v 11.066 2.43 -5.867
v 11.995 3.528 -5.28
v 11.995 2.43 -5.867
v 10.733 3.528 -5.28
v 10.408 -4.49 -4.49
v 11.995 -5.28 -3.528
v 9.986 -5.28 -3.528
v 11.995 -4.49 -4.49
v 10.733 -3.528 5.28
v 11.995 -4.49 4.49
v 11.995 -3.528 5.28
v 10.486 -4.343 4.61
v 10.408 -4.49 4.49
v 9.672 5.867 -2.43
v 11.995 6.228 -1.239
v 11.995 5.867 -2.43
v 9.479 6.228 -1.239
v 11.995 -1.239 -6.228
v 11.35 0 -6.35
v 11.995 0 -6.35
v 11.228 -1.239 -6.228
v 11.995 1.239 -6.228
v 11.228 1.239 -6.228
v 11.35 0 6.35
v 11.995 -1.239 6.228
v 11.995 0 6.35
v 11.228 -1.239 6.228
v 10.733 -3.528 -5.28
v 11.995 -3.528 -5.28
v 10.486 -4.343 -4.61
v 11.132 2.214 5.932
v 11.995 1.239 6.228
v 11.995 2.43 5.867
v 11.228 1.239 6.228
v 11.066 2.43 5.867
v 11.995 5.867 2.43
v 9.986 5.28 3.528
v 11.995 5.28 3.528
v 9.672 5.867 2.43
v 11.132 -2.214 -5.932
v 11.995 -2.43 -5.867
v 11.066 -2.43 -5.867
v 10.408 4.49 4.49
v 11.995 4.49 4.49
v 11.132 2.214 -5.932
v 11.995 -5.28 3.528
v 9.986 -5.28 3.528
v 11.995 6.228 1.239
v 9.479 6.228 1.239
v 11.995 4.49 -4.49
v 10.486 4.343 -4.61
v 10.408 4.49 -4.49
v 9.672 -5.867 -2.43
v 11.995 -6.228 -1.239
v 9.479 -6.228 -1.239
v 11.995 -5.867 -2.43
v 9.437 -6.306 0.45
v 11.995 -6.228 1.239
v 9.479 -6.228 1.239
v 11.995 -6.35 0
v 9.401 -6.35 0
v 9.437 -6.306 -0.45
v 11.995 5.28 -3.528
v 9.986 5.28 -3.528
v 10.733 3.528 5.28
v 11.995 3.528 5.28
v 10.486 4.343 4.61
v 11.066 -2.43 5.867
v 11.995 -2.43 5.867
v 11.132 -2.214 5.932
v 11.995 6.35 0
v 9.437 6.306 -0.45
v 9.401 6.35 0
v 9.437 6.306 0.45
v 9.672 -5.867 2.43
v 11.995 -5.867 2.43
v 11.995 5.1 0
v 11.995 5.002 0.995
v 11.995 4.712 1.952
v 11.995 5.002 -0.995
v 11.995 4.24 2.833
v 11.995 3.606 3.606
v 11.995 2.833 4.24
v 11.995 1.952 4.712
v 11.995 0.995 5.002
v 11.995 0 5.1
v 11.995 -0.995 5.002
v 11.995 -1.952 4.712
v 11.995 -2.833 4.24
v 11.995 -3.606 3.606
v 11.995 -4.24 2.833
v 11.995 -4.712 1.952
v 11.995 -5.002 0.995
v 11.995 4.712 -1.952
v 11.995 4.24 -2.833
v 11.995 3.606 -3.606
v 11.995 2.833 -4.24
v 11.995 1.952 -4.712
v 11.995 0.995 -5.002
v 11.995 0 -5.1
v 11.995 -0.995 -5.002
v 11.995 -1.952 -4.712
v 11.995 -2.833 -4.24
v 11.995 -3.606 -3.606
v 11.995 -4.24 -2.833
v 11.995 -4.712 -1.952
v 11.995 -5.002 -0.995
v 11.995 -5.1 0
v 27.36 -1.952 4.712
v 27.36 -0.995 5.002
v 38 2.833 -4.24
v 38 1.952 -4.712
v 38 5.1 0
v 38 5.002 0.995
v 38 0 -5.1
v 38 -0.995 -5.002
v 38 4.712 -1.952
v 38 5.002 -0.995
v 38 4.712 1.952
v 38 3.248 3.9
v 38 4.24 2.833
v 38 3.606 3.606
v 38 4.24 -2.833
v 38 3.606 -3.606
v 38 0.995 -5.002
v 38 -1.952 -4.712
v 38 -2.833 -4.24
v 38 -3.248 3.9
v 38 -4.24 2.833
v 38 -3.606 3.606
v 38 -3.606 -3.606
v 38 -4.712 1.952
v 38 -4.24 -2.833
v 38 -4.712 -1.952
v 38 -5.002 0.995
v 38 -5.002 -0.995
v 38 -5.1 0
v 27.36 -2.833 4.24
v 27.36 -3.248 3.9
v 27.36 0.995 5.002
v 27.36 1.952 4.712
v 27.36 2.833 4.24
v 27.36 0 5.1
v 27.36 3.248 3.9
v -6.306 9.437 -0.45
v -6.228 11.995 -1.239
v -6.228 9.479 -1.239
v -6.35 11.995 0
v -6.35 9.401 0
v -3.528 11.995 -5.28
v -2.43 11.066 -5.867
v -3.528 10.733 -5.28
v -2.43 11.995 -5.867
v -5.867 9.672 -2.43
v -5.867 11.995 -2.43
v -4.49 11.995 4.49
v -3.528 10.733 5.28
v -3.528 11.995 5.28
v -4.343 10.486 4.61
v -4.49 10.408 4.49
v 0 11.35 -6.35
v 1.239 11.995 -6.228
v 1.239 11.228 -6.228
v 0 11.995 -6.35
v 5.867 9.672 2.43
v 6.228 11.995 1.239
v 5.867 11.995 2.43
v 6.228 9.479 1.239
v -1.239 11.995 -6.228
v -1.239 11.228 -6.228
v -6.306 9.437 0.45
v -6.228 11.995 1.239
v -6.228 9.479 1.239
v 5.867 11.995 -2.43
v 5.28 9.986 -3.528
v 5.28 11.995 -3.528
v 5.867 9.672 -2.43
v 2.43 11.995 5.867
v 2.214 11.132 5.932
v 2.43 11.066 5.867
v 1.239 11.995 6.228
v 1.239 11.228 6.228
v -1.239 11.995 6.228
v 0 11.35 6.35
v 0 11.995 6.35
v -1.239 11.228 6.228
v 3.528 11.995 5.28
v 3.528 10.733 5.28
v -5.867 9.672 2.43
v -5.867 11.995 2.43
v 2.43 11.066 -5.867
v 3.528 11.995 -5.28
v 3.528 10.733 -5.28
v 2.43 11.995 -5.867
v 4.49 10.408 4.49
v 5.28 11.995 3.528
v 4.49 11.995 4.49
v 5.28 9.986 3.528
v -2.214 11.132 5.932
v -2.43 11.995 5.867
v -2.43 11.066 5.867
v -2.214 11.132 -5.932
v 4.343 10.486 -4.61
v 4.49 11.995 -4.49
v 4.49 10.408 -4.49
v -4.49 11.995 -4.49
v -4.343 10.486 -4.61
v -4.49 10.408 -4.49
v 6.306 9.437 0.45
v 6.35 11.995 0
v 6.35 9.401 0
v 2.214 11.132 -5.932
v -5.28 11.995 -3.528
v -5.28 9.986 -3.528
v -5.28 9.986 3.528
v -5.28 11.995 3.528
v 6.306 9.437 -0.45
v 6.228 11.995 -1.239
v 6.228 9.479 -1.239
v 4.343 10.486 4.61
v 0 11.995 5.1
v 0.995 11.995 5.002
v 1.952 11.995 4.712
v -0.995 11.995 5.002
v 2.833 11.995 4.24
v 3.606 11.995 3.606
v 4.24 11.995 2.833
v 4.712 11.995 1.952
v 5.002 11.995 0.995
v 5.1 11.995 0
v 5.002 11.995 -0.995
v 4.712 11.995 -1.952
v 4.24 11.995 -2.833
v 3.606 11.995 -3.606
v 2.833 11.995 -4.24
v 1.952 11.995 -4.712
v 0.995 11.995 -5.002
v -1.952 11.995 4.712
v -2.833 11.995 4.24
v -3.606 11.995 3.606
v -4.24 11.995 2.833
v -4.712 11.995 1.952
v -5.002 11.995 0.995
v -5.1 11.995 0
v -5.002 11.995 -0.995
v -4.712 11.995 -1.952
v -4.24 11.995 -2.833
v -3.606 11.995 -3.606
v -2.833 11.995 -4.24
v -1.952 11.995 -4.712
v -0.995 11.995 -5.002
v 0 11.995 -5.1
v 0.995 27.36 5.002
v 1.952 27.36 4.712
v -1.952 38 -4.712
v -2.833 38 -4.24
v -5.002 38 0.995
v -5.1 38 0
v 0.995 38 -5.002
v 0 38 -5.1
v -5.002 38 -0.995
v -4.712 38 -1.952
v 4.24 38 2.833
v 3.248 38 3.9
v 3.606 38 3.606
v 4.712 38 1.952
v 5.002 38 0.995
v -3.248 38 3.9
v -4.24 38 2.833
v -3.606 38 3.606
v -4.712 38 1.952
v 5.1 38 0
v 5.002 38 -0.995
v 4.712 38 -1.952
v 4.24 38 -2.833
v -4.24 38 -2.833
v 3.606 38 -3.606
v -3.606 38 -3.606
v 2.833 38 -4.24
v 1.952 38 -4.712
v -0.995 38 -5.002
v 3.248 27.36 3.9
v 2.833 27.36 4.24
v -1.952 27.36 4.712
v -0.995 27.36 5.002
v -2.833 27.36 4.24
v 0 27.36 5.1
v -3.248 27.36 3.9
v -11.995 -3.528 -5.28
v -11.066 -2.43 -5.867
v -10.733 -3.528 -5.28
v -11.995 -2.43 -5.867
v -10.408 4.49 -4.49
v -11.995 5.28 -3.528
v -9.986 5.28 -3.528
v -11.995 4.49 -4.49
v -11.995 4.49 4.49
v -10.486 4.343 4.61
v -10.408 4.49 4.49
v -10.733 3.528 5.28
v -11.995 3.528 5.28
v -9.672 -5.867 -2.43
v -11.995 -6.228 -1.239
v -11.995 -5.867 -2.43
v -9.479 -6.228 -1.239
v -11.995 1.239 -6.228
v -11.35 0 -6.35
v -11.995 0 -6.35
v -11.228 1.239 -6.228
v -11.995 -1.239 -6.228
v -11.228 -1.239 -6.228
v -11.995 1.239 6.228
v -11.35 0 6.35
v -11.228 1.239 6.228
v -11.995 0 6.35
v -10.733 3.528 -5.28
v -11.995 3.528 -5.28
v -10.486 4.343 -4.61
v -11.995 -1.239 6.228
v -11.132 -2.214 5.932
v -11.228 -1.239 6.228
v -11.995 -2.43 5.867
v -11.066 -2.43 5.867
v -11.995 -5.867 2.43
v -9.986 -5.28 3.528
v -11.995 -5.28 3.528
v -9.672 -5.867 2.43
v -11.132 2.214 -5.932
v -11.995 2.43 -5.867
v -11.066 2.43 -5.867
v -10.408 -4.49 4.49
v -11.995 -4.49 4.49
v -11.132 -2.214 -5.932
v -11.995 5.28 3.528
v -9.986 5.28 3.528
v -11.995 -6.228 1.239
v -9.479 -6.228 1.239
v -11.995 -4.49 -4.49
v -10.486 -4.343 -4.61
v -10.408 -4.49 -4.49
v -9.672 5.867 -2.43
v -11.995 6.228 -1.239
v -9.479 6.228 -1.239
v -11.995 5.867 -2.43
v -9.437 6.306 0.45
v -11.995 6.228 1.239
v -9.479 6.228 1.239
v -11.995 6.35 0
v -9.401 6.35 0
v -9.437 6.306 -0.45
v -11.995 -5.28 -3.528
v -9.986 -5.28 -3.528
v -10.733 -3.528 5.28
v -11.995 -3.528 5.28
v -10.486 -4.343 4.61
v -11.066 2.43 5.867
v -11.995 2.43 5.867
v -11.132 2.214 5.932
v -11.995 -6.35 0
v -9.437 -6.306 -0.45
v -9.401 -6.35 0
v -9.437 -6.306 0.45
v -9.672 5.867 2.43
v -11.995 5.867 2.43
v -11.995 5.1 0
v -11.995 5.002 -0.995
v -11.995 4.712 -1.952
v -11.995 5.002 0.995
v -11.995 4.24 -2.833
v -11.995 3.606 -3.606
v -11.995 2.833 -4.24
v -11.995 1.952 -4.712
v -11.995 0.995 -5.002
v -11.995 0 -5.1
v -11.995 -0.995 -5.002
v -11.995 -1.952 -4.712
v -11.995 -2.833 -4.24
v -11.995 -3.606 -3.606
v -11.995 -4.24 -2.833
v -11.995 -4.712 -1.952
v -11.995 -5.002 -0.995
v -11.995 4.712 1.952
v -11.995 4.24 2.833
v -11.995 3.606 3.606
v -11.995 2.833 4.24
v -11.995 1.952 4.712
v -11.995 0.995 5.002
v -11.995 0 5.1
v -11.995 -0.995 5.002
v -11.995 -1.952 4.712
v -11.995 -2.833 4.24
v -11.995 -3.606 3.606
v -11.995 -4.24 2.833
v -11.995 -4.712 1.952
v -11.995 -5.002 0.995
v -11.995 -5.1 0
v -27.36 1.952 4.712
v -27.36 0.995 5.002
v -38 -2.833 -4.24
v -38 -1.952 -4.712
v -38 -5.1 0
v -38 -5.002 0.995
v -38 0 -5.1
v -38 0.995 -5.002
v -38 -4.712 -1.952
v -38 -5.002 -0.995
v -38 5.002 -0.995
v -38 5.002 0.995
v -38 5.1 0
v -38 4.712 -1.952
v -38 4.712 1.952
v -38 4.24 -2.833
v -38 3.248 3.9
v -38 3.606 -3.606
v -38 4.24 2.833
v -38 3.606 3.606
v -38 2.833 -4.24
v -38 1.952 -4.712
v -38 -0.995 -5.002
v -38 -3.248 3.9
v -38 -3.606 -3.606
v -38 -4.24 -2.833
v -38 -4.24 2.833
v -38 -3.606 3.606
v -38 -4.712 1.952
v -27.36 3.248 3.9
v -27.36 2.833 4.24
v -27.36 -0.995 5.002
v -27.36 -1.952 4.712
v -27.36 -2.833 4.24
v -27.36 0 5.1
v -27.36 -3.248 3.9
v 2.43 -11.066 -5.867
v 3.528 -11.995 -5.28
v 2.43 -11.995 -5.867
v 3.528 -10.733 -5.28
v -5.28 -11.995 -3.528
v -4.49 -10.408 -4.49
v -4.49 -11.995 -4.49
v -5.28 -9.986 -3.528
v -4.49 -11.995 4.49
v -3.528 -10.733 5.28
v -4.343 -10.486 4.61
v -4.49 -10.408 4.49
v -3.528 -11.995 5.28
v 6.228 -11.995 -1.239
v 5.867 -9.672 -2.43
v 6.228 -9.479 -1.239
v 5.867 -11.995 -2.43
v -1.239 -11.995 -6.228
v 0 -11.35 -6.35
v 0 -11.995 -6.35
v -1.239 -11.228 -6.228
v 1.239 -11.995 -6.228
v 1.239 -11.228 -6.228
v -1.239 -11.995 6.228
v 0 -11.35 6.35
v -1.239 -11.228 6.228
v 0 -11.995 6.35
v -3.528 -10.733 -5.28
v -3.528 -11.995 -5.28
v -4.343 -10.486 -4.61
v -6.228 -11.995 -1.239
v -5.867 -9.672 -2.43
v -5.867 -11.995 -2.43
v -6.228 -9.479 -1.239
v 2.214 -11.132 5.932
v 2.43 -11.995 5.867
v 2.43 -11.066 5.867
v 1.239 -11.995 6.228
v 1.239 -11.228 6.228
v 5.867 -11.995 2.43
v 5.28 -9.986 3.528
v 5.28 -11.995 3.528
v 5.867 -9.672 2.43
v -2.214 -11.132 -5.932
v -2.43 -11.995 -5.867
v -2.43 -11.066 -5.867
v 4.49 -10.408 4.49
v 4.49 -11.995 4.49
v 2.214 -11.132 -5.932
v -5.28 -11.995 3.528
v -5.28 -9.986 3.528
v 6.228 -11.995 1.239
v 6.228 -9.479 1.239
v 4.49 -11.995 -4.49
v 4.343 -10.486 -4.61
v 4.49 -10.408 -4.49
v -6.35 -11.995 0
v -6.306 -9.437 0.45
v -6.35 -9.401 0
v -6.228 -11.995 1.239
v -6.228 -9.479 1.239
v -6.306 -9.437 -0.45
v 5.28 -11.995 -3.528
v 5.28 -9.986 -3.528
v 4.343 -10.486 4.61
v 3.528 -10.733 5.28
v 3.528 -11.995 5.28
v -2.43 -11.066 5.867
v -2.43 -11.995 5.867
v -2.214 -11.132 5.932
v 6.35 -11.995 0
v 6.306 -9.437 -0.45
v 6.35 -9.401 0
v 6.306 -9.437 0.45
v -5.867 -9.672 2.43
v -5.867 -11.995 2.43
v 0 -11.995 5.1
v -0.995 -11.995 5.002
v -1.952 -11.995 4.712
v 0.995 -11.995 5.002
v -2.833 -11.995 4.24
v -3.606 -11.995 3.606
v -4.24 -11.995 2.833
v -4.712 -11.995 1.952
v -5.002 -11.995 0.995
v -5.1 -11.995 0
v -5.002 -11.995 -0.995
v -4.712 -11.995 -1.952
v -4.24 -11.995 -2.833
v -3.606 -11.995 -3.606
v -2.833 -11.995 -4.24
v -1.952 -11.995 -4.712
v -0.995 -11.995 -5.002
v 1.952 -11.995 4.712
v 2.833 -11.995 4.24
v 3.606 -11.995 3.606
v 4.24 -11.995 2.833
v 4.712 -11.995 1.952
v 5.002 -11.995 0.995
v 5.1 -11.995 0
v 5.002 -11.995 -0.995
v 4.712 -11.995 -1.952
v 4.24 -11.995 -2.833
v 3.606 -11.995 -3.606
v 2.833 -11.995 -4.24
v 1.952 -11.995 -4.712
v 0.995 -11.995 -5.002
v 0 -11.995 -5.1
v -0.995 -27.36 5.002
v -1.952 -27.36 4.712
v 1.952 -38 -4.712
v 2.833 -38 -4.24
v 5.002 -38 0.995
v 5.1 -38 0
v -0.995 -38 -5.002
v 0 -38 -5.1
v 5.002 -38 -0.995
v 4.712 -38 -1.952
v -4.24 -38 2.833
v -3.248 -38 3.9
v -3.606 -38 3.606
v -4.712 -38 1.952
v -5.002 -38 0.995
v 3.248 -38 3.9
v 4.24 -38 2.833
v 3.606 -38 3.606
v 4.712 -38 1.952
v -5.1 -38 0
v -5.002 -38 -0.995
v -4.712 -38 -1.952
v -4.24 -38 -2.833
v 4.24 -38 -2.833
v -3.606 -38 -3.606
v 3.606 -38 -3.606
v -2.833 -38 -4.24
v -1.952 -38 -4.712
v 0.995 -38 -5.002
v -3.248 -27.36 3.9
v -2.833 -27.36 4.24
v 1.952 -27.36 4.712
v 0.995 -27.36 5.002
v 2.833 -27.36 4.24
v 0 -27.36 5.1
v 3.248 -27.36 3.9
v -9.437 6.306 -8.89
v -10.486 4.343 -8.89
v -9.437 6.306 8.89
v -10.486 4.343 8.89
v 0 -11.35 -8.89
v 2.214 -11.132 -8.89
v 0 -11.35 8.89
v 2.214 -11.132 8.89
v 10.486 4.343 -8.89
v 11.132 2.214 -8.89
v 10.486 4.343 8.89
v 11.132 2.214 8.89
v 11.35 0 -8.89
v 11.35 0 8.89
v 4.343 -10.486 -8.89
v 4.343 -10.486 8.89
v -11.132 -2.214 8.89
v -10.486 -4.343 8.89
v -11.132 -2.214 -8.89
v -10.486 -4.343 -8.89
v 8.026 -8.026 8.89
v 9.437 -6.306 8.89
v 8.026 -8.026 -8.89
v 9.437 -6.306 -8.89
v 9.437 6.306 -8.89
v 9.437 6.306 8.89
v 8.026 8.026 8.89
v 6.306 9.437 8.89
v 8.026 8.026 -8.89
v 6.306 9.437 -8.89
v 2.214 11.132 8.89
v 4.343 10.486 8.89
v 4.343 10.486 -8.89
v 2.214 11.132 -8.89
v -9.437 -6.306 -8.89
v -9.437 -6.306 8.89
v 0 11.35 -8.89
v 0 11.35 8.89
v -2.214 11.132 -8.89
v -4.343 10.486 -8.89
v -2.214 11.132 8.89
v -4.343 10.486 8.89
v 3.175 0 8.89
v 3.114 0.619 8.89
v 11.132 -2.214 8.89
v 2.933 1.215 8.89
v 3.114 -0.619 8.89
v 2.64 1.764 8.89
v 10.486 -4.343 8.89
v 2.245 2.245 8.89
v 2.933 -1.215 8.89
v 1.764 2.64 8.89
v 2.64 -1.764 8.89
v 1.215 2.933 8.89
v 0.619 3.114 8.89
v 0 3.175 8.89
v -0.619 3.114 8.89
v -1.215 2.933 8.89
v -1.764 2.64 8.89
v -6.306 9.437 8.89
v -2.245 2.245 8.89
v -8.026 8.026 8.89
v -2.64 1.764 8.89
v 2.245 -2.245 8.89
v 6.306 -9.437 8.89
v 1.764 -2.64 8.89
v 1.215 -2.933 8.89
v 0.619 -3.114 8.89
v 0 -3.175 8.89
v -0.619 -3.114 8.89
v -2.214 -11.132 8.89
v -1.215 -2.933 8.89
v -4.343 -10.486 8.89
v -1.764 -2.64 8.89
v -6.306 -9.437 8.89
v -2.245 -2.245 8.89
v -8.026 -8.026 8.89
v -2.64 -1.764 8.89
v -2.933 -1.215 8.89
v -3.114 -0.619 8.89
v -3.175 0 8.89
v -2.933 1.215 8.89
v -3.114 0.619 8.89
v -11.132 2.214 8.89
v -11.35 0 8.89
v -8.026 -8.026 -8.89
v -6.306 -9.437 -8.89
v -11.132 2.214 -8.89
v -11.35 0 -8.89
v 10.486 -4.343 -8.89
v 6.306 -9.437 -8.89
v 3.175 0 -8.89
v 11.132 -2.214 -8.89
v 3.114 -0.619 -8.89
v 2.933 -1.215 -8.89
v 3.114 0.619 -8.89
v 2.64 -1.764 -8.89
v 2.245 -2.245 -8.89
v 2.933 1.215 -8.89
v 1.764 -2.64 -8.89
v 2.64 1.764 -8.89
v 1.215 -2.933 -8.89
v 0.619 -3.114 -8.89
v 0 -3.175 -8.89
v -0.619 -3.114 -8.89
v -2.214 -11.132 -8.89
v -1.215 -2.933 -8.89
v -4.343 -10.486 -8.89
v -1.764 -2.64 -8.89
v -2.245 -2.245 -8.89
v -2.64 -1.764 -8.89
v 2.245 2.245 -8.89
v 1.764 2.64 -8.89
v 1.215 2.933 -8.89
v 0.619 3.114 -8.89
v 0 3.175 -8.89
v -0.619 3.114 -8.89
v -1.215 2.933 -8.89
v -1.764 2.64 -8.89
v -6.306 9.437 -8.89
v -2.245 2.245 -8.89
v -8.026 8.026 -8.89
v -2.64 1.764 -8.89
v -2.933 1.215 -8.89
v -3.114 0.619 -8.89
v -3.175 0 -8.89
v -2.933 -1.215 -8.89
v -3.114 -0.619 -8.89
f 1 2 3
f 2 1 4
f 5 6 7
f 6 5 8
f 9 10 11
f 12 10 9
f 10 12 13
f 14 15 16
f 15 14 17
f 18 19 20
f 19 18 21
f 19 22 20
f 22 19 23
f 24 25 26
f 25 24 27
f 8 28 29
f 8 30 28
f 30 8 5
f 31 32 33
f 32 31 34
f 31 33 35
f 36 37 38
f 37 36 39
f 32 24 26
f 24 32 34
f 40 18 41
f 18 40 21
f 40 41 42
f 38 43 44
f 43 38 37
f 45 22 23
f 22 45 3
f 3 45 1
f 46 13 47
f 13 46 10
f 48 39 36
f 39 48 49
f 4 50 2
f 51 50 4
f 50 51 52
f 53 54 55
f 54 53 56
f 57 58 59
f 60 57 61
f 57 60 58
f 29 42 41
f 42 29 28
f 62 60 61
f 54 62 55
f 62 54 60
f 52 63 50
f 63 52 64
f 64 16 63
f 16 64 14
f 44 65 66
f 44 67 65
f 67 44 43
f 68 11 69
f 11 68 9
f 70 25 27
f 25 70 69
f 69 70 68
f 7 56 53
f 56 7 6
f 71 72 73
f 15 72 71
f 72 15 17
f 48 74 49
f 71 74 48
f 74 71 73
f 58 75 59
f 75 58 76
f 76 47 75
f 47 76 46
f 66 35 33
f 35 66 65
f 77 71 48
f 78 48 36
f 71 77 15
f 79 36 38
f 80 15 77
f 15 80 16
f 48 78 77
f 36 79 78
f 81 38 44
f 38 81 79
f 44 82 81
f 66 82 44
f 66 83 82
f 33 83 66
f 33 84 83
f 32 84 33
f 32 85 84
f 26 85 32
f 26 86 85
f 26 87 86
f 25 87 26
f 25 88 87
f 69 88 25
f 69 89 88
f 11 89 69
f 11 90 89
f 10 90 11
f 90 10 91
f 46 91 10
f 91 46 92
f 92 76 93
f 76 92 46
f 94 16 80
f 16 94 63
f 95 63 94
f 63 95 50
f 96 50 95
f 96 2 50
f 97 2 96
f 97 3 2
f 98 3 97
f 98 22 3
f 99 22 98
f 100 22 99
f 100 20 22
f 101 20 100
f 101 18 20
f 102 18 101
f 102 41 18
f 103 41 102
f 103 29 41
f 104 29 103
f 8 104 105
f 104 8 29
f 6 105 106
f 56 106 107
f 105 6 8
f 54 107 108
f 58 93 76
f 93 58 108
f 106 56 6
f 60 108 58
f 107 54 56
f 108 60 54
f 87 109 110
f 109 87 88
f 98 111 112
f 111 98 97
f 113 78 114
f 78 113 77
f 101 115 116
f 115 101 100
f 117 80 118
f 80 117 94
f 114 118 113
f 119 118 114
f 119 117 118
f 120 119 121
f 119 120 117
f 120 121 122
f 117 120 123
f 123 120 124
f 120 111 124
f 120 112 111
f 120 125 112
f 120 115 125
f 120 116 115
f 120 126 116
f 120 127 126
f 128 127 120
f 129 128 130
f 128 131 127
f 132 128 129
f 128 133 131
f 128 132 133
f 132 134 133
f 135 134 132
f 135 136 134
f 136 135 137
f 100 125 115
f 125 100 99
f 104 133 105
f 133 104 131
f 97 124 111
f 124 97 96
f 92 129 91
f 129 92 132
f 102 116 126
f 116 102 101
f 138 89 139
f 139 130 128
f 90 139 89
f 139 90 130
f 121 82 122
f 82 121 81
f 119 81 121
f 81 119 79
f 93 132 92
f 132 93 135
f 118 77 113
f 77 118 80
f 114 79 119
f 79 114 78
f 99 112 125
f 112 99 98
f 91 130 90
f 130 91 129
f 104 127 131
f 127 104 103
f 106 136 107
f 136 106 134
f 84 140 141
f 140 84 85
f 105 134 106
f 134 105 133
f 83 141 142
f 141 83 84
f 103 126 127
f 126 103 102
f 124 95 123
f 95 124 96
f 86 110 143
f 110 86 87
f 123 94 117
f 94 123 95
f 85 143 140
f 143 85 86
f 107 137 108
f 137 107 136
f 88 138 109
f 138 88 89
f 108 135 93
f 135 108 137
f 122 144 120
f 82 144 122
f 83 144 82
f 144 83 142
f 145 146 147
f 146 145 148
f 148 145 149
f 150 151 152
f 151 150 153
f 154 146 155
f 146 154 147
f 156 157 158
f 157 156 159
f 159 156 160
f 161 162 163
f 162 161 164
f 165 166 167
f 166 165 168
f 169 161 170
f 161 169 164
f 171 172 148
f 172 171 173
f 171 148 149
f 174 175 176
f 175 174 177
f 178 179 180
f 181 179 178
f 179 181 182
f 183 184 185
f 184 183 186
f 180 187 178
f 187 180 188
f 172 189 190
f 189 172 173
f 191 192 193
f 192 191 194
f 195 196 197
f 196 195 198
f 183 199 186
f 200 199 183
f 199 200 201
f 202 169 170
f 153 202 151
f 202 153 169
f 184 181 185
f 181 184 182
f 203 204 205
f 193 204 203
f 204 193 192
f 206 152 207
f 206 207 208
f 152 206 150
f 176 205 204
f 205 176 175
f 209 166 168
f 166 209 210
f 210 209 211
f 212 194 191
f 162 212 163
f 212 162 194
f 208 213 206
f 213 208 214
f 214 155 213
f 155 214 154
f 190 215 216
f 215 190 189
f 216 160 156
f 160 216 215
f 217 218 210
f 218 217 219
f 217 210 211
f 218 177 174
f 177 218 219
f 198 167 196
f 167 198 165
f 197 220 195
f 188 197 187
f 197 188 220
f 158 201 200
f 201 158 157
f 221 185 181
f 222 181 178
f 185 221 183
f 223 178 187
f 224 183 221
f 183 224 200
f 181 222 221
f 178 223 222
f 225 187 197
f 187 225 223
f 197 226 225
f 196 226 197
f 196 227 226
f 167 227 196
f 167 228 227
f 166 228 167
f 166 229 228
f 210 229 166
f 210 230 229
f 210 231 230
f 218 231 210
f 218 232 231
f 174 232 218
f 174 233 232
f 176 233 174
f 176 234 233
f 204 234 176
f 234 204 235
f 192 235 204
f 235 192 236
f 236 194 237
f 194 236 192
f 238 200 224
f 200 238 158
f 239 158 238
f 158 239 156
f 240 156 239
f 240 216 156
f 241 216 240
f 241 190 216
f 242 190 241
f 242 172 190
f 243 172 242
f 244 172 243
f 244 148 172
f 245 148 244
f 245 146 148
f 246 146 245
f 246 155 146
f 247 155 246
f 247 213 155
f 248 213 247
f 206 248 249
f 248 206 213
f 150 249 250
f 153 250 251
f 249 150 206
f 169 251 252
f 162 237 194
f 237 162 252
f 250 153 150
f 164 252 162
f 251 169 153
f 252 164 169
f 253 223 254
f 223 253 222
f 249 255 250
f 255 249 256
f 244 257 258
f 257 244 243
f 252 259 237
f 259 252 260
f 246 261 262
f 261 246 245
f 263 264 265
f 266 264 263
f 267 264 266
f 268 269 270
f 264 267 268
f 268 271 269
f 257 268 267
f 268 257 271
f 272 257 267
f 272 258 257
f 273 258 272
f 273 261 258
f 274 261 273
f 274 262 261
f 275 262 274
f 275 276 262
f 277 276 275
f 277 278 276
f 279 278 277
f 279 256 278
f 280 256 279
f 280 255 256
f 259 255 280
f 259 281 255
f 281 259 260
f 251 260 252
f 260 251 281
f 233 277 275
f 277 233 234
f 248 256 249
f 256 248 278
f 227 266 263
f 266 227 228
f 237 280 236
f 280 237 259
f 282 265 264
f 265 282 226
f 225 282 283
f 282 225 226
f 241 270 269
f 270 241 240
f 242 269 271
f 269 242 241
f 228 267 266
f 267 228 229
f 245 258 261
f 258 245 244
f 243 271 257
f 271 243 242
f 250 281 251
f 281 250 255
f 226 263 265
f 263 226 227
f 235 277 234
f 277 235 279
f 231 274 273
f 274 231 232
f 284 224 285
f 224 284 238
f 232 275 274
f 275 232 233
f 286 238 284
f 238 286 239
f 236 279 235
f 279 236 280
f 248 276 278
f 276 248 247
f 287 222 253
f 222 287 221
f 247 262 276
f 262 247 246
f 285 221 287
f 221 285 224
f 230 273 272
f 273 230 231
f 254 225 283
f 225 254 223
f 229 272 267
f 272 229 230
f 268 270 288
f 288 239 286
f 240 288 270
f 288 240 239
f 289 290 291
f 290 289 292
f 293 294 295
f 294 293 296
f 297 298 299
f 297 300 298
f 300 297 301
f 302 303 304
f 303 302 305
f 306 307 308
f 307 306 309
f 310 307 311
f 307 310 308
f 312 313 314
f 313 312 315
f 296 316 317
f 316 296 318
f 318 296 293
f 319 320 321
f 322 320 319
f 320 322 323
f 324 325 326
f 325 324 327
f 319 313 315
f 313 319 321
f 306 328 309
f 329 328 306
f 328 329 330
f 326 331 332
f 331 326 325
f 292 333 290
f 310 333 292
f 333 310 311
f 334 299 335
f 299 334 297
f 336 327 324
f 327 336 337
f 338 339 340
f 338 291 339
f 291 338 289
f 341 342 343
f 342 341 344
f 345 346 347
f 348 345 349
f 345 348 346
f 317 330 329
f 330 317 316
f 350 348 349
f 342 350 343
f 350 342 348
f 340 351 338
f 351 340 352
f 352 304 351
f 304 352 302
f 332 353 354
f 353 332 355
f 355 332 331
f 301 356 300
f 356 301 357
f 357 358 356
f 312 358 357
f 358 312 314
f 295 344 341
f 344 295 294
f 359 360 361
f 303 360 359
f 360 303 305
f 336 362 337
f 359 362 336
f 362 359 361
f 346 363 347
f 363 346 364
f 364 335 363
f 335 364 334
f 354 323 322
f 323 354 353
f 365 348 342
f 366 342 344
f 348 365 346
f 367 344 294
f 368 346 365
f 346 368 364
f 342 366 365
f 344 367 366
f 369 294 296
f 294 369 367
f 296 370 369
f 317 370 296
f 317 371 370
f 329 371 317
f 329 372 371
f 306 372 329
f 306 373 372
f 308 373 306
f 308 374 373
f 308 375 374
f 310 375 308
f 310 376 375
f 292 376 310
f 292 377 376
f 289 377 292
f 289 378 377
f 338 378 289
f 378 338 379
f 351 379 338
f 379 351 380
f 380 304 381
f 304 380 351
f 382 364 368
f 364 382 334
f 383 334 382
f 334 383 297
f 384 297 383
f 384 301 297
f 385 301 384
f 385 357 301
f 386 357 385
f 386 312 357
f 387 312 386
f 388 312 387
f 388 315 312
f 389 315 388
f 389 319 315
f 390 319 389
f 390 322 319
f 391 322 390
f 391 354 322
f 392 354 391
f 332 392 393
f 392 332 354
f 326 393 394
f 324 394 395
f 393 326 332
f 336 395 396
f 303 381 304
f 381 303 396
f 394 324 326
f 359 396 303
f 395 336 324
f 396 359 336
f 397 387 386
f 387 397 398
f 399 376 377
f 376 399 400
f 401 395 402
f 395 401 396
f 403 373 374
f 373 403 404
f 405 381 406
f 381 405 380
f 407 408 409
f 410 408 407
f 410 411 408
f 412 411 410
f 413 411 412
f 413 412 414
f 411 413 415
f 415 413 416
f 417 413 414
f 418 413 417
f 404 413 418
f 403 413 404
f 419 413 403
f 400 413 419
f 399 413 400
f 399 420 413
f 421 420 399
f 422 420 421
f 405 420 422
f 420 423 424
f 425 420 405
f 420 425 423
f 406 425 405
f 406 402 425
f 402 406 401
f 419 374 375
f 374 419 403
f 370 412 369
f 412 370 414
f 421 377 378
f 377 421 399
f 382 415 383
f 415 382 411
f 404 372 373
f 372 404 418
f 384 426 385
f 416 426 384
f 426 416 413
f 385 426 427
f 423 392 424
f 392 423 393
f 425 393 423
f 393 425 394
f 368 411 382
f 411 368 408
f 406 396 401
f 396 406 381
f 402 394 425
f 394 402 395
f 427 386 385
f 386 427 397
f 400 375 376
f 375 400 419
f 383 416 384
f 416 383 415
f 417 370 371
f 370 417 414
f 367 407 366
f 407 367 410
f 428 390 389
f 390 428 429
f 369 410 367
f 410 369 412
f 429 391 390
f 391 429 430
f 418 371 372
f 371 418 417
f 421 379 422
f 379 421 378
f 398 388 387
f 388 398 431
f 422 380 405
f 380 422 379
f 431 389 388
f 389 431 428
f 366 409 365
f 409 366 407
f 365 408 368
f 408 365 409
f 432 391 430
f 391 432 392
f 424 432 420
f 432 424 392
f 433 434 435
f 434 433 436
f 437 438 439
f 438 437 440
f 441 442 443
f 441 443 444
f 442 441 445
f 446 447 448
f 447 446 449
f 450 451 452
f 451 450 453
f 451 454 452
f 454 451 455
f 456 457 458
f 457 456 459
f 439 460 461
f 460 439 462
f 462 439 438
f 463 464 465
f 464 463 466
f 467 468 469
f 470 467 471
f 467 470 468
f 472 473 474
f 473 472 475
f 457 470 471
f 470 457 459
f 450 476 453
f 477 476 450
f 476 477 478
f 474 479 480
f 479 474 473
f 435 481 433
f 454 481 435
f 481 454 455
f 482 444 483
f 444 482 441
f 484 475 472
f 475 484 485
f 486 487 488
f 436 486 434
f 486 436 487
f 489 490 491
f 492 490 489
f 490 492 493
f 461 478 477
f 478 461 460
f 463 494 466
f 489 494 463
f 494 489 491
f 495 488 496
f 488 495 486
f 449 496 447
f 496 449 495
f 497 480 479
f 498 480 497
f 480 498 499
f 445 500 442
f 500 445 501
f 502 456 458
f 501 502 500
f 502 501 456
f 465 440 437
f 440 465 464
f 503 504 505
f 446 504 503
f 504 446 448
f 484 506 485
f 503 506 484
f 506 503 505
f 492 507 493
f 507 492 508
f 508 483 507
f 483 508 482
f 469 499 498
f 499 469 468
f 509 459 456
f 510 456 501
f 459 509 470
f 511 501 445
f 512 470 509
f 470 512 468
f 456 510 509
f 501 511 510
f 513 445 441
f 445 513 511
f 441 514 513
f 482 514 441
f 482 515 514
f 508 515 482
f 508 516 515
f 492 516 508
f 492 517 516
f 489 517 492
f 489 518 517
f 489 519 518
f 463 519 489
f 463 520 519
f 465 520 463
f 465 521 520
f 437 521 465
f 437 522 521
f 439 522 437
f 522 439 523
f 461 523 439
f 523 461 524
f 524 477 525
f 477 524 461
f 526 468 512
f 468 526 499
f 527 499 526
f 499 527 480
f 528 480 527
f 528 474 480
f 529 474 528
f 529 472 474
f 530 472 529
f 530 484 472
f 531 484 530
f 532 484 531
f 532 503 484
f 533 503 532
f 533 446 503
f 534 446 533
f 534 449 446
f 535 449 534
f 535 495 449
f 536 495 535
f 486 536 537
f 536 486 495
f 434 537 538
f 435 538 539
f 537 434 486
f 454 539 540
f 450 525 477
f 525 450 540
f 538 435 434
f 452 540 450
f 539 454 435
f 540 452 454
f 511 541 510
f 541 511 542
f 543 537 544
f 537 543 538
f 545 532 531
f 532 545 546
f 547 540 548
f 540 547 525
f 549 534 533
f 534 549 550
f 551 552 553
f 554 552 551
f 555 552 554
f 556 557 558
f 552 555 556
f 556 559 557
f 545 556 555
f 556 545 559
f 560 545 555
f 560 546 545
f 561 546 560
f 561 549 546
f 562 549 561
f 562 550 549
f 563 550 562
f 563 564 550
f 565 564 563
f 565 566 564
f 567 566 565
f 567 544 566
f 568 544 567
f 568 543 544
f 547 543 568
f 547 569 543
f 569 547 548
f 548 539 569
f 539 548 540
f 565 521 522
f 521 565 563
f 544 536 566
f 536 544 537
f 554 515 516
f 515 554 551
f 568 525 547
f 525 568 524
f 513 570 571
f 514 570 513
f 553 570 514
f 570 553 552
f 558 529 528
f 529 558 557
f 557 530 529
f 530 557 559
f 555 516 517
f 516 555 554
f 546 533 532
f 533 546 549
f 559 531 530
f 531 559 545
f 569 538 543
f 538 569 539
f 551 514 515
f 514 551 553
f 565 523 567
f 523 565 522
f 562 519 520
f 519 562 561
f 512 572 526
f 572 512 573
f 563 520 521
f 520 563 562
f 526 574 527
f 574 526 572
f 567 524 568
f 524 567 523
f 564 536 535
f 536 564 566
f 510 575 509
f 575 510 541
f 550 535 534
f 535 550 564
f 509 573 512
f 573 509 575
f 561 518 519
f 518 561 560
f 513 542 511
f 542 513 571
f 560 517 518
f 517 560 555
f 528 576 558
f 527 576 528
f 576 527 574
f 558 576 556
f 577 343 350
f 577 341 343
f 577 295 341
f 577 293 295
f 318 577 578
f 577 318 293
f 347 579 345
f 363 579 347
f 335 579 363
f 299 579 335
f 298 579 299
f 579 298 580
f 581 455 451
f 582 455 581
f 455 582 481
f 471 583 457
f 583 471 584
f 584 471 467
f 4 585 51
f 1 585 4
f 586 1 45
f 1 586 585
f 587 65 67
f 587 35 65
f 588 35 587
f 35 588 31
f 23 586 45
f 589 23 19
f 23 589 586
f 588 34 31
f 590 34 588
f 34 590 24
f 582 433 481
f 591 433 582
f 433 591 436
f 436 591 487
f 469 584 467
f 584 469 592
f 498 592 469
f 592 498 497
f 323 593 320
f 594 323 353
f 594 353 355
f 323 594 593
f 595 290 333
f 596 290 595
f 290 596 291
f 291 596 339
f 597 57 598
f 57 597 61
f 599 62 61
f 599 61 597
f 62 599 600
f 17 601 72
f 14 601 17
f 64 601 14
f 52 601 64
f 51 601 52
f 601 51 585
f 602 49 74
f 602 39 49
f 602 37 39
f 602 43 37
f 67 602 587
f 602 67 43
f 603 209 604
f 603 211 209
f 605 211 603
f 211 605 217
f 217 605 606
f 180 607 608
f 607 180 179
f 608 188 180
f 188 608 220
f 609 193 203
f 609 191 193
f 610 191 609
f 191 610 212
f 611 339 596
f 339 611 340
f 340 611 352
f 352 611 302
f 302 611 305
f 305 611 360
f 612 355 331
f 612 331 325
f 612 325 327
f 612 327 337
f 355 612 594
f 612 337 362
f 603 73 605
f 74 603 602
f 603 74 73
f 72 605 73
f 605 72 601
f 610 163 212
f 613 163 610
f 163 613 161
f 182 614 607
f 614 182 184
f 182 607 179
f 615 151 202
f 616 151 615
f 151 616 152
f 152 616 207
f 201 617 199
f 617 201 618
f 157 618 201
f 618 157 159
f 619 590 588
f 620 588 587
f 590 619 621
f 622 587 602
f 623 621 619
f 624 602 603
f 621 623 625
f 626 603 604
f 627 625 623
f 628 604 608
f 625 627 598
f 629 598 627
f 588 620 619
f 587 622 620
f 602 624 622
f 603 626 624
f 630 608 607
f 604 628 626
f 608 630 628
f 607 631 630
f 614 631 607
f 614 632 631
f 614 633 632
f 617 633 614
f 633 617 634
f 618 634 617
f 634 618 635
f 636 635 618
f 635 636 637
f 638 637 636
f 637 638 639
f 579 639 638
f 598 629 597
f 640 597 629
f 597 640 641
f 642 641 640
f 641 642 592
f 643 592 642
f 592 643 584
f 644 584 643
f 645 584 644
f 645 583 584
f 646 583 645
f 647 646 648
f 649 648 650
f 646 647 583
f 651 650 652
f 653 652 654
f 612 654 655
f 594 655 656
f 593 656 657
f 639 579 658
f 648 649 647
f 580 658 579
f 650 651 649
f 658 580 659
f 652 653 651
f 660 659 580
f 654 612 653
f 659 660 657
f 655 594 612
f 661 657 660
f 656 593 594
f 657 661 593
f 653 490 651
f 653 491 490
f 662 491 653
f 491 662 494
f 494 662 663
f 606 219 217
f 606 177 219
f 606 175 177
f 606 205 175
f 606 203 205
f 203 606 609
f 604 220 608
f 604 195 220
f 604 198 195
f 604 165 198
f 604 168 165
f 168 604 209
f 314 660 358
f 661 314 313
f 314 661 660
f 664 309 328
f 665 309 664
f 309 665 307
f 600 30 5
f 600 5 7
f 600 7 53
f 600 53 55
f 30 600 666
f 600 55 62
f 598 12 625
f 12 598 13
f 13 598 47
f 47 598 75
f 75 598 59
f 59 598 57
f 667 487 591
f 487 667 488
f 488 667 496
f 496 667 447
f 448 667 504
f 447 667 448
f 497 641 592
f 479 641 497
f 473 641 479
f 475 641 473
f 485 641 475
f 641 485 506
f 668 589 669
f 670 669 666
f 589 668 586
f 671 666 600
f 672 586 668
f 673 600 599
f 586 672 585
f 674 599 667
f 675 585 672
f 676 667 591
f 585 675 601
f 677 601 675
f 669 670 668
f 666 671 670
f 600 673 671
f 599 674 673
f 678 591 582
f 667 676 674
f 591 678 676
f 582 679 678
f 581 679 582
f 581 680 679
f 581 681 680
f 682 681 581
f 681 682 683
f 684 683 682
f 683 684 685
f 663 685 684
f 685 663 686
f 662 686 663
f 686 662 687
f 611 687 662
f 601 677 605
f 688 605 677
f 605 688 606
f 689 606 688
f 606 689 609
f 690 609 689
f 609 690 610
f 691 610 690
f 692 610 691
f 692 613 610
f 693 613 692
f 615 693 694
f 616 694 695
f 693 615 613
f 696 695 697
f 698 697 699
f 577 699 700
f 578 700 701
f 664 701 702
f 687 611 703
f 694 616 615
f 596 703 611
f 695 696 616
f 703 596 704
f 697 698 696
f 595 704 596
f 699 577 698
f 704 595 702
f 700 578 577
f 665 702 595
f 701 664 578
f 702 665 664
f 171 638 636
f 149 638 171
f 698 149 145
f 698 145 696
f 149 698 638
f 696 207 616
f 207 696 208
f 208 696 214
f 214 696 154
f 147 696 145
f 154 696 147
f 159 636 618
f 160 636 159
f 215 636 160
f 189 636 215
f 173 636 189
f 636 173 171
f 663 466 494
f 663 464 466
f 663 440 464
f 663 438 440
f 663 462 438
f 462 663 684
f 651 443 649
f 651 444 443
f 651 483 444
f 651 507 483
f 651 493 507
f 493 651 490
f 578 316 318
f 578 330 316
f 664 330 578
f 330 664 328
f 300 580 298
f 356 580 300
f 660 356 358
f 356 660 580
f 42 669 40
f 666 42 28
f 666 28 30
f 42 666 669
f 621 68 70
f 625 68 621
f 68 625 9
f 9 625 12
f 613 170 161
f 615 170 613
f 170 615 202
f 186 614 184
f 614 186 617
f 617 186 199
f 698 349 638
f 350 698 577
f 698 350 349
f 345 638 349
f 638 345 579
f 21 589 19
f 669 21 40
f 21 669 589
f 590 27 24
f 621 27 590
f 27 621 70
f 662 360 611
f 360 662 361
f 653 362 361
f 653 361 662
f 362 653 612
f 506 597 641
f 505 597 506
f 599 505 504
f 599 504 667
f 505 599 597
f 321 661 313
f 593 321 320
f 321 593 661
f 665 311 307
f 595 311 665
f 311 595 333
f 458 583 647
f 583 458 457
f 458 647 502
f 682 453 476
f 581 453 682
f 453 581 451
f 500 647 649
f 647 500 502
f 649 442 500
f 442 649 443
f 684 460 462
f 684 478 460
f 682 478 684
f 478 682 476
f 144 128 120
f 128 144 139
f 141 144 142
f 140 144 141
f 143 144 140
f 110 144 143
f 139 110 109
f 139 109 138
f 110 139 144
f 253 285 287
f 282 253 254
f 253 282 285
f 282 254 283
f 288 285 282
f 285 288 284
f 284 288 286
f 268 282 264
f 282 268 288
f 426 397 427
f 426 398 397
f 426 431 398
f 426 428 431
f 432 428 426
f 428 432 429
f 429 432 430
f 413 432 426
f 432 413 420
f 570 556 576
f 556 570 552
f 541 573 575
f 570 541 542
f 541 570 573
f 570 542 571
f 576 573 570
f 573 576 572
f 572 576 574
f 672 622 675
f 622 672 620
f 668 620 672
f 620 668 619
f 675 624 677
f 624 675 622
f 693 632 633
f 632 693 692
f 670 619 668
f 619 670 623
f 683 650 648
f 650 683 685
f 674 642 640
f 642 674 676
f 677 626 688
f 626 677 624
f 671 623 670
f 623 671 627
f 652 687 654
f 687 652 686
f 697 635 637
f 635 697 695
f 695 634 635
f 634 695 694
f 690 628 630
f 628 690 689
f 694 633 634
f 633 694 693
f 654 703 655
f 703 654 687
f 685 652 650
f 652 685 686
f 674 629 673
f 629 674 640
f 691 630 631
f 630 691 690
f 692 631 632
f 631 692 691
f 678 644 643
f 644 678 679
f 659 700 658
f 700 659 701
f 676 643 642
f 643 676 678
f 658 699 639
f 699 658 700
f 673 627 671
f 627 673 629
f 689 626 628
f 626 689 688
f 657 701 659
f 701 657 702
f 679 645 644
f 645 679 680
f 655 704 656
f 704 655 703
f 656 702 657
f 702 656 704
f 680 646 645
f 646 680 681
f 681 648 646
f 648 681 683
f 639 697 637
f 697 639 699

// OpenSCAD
$fn = 32;

// ----------------------------------------------------------------------
// Cardan cross: 76 mm span, 12.7 mm trunnions
// ----------------------------------------------------------------------

// --- parameters (mm) ---
journal_d = 12.7;         // trunnion diameter
arm_len = 38;             // trunnion length from the centre
step_r = 4.32;            // step position from the centre
step_d = 10.2;            // journal diameter after the step
hub_d = 22.7;             // hub diameter
hub_h = 17.78;            // hub height
bore_d = 6.35;            // hub bore
flat_d = 1.2;             // depth of the journal flat
flat_len = 10.64;         // length of the journal flat

difference() {
  union() {
    /* hub along the joint axis */
    cylinder(h = hub_h, d = hub_d, center = true);
    for (a = [0 : 90 : 270]) rotate([0, 0, a]) {
      /* trunnion, sunk into the hub */
      translate([hub_d / 4, 0, 0]) rotate([0, 90, 0]) cylinder(h = step_r + 2, d = journal_d);
      /* stepped journal out to the tip */
      translate([step_r - 0.5, 0, 0]) rotate([0, 90, 0]) cylinder(h = arm_len + 0.5 - step_r, d = step_d);
    }
  }
  /* lubrication bore through the hub, 2.5 mm clear on both sides */
  translate([0, 0, -hub_h / 2 - 2.5]) cylinder(h = hub_h + 5, d = bore_d);
  /* machined flat on each journal tip */
  for (a = [0 : 90 : 270]) rotate([0, 0, a]) {
    translate([arm_len - flat_len, -step_d, step_d / 2 - flat_d]) cube([flat_len + 0.5, 2 * step_d, flat_d + 2.5]);
  }
}
